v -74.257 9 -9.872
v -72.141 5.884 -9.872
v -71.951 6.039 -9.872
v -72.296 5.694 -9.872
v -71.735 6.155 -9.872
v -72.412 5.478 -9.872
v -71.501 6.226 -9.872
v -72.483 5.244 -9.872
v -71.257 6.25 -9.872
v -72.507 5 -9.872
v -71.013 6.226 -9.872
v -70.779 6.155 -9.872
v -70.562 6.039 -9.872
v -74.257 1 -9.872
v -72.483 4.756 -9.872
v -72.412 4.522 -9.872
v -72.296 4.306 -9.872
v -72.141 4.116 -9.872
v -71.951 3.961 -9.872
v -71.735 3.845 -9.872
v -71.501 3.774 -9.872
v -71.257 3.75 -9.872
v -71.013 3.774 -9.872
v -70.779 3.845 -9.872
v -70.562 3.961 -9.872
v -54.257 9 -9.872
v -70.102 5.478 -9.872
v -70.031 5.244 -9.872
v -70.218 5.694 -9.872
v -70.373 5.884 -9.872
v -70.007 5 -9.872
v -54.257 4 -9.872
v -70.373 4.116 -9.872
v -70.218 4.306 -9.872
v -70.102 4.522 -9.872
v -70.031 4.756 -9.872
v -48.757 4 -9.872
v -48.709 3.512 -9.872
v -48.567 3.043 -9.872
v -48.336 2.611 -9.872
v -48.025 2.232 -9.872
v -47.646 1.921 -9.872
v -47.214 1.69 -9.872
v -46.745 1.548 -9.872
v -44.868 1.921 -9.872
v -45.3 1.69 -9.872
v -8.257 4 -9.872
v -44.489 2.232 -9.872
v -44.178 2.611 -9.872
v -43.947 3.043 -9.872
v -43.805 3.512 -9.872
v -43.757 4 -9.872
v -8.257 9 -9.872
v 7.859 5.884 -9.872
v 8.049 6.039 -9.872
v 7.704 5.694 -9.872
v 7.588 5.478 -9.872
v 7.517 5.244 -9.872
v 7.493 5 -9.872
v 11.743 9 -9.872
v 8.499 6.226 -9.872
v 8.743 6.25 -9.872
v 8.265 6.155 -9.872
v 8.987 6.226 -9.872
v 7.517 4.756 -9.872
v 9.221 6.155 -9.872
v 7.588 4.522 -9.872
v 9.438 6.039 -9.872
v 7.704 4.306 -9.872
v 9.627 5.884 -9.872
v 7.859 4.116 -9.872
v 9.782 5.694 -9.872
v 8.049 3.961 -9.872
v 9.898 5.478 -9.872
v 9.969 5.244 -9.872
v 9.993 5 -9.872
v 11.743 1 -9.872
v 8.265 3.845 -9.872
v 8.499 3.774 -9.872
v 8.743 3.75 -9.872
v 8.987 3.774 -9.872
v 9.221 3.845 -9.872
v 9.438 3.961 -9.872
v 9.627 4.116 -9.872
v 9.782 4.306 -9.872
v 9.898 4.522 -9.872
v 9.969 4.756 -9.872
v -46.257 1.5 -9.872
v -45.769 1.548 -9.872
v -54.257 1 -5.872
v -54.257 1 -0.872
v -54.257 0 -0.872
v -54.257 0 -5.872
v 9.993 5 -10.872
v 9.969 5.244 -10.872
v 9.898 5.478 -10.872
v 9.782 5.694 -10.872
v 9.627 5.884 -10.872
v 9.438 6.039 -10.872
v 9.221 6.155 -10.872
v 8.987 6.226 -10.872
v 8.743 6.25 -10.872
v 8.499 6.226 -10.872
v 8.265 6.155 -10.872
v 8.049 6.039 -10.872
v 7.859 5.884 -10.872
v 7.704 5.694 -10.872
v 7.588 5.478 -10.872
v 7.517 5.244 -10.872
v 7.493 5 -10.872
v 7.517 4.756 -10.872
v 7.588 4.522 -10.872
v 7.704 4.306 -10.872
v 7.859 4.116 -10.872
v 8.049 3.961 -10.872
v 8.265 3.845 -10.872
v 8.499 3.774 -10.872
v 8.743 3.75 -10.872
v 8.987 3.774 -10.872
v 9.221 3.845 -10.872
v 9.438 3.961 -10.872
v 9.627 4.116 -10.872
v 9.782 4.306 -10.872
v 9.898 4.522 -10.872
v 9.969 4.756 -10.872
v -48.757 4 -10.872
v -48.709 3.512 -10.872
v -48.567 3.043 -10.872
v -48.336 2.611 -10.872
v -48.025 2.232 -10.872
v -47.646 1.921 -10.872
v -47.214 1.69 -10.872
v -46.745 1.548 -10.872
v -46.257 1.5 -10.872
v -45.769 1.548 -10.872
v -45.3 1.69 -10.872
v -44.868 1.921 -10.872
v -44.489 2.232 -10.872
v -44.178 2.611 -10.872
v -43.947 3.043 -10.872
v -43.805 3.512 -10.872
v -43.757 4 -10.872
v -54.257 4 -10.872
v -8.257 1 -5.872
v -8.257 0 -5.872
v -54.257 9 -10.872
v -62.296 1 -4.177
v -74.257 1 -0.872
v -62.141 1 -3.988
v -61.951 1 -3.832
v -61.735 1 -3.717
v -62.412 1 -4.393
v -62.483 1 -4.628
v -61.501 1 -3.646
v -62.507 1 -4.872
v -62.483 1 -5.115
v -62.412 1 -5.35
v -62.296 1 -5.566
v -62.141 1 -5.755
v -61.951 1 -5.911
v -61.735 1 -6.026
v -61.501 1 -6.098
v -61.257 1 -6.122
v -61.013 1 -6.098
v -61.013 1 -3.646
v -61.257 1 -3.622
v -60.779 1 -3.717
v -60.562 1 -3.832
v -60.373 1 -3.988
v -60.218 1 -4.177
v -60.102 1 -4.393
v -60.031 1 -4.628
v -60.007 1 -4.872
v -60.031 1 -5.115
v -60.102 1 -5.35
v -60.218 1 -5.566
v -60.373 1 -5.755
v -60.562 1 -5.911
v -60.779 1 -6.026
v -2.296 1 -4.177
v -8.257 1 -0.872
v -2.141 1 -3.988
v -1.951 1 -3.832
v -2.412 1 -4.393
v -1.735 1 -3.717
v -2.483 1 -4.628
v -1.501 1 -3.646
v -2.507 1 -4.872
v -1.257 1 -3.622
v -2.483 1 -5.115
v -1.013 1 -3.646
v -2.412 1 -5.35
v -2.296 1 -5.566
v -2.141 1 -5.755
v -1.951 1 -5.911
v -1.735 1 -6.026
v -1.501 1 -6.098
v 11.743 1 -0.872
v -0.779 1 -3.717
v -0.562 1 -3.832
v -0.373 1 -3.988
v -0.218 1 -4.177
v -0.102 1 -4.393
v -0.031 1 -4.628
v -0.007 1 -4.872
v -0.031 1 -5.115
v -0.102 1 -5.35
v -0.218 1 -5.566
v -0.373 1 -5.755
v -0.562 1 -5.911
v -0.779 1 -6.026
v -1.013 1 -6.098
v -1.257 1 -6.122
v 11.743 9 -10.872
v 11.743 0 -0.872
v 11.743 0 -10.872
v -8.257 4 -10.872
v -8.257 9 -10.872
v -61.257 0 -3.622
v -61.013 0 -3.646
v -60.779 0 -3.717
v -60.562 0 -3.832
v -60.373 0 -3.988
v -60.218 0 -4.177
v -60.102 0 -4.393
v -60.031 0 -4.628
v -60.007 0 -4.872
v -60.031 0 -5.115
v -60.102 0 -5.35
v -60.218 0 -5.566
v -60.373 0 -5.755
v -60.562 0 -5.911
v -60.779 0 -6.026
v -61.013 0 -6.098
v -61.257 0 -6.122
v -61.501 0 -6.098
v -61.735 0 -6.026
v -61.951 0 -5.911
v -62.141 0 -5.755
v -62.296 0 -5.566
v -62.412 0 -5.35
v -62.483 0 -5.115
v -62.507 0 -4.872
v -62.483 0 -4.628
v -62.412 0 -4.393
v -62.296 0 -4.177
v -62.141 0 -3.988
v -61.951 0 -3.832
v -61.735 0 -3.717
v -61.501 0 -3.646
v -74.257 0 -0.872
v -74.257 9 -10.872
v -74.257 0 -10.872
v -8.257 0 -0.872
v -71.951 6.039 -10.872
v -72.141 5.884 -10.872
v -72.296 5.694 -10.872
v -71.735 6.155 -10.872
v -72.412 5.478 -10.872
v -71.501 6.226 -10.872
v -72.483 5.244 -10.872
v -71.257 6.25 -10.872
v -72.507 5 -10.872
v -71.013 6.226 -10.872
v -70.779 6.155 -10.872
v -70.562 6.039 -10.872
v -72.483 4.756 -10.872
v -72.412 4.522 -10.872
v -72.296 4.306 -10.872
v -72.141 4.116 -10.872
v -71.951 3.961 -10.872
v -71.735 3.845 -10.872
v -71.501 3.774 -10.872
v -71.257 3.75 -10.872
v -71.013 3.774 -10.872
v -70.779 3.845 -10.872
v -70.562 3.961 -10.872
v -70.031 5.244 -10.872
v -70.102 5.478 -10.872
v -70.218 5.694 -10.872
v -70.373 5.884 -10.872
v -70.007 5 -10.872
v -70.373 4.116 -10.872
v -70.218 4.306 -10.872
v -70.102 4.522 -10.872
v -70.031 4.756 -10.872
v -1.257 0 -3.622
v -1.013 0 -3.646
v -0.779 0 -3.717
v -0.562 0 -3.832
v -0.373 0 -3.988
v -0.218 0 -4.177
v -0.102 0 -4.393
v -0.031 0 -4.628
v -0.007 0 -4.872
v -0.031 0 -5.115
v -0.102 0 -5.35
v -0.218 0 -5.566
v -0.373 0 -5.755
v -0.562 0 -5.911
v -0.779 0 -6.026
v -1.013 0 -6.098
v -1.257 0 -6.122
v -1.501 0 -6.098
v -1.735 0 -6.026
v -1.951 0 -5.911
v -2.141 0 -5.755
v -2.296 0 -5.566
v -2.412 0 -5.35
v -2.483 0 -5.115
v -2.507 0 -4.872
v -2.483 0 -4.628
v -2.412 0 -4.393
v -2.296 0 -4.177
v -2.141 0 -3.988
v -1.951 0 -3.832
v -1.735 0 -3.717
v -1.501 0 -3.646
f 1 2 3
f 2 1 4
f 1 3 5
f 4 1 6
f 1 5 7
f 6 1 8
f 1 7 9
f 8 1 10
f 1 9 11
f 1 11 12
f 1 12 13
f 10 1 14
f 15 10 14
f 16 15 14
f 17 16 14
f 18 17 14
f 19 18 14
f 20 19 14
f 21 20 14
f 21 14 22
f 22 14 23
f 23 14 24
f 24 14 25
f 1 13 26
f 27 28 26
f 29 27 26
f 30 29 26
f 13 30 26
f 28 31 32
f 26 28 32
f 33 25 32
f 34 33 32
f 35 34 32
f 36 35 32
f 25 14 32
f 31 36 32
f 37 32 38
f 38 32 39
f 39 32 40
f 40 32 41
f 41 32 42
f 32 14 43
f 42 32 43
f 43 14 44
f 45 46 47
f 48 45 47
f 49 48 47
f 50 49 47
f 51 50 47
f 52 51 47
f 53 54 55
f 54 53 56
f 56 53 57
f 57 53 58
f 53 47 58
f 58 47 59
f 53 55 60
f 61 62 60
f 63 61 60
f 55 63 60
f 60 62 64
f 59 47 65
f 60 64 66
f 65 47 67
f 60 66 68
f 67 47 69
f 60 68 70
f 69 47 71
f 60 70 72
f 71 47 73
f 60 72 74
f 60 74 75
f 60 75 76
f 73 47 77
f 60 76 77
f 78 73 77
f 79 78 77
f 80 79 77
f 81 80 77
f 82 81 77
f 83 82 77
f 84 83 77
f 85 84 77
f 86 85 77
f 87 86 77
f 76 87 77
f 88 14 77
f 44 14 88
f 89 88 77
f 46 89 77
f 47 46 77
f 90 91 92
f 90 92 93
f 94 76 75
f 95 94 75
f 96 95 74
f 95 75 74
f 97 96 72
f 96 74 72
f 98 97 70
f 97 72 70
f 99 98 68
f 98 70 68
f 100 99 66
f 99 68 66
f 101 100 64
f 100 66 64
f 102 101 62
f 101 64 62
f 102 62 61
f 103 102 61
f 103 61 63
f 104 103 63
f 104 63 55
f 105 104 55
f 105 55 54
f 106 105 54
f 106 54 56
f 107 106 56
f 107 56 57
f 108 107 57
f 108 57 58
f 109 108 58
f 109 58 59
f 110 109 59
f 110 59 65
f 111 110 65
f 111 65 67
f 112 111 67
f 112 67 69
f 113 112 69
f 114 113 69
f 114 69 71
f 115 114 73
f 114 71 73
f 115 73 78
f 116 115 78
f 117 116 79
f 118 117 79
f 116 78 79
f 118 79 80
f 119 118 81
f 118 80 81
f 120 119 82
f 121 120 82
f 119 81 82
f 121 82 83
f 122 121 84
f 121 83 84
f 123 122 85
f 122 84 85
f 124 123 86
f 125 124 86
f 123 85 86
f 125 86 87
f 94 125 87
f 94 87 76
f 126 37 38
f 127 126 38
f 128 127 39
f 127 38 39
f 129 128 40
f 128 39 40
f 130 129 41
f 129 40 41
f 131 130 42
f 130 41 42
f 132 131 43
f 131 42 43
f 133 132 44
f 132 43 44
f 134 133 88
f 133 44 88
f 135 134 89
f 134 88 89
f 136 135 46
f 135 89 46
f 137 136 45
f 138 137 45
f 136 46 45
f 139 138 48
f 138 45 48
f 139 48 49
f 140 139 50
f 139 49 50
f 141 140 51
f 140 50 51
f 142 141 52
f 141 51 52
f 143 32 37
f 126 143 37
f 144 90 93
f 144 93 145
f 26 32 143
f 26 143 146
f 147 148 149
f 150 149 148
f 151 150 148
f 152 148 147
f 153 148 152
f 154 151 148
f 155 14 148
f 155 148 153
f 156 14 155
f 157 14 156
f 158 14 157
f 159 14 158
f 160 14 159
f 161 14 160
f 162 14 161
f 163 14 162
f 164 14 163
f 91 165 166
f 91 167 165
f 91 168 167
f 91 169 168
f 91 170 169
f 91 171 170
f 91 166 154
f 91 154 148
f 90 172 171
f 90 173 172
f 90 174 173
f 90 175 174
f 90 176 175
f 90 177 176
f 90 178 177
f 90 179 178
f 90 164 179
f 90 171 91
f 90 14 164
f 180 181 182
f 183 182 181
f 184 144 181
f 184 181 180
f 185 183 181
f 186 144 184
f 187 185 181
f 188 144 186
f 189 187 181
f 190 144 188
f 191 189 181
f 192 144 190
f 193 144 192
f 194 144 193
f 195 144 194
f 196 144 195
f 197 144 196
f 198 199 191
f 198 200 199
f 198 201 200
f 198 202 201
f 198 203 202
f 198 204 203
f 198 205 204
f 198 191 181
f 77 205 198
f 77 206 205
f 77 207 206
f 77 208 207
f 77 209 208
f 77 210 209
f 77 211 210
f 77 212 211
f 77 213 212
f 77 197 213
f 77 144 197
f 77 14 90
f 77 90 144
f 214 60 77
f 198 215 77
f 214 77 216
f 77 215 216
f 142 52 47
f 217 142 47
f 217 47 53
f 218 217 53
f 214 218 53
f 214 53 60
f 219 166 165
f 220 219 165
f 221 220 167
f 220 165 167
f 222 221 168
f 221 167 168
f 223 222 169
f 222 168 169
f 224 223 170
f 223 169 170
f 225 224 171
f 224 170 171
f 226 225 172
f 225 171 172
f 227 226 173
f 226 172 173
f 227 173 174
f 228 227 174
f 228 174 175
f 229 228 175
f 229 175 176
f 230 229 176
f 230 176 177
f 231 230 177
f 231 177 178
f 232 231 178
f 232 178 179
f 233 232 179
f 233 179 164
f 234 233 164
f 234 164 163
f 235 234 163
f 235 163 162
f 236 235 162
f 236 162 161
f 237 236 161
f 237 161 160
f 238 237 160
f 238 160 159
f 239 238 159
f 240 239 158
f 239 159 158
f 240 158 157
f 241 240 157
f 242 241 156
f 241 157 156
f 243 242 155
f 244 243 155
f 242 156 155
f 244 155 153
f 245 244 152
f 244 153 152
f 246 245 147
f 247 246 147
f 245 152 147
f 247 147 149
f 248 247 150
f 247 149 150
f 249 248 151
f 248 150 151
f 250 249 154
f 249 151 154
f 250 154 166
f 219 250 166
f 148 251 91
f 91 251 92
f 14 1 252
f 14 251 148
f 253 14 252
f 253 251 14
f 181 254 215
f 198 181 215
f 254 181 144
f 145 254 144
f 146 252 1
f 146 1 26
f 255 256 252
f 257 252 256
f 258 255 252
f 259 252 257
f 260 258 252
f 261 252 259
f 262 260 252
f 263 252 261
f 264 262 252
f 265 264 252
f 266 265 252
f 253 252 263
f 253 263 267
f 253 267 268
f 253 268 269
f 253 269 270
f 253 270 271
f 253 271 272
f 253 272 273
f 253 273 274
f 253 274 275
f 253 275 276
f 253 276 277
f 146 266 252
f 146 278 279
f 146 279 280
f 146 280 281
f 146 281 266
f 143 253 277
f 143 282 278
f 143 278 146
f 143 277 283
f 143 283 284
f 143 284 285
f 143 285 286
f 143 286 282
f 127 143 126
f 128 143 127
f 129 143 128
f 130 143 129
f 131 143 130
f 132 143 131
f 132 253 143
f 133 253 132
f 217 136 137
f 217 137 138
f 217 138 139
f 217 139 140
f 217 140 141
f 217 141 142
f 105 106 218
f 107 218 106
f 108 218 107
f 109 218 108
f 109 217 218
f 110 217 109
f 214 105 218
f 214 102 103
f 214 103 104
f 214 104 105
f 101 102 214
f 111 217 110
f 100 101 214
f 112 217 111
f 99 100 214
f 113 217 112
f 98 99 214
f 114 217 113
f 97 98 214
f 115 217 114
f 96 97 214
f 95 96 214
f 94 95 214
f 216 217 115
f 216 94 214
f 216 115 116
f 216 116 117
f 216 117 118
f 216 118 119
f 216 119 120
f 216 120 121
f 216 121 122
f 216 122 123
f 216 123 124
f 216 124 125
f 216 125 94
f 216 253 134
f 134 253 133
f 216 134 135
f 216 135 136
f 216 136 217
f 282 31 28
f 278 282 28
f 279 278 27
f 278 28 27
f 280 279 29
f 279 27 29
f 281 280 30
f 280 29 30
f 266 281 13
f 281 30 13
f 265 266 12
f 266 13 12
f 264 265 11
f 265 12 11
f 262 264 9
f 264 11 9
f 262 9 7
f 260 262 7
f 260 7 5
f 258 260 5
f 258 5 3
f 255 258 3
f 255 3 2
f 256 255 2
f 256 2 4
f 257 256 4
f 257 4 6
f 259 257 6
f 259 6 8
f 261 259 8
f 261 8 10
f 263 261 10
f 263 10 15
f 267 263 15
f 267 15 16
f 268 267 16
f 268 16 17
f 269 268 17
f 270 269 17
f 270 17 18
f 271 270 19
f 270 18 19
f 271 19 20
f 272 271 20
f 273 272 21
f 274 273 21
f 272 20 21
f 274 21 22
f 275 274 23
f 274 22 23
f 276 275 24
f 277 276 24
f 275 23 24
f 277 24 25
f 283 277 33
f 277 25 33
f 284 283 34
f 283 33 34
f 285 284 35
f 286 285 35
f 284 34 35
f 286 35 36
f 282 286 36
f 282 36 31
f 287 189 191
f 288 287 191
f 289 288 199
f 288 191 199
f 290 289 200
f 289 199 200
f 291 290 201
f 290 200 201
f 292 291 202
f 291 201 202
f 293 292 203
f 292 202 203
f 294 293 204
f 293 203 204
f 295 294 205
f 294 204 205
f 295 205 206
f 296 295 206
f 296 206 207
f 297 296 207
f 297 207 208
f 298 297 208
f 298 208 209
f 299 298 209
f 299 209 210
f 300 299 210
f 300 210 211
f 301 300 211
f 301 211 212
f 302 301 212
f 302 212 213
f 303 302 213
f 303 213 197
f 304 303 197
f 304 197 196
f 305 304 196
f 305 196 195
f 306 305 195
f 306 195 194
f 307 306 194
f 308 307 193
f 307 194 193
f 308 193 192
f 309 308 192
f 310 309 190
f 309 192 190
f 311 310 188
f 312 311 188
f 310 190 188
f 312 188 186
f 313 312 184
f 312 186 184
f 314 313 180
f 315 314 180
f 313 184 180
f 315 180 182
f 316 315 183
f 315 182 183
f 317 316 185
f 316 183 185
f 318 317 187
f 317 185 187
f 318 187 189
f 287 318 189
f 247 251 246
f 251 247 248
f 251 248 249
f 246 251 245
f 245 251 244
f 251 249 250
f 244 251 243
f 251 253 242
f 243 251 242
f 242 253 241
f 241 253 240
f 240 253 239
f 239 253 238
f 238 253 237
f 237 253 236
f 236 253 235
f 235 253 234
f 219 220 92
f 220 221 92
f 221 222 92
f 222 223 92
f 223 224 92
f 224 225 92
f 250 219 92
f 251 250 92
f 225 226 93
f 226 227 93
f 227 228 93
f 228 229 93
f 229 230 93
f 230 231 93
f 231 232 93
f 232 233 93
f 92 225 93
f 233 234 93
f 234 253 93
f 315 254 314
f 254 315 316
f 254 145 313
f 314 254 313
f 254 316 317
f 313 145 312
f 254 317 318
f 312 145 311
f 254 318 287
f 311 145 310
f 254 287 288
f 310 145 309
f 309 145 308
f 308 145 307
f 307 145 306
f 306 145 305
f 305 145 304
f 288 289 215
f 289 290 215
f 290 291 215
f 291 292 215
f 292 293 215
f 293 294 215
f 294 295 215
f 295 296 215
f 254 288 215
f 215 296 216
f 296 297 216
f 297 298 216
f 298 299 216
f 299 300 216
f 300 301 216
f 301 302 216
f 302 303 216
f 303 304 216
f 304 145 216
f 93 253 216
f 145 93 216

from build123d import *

# Parameters (mm, degrees)
ESQUISSE1_W             = 86
ESQUISSE1_H             = 10
BOSS_EXTRU_1_DEPTH      = 1
ESQUISSE2_W             = 86
ESQUISSE2_H             = 1
BOSS_EXTRU_2_DEPTH      = 8
ESQUISSE3_R             = 1.25
ENL_V_MAT_EXTRU_1_DEPTH = 10
ESQUISSE4_R             = 1.25
ENL_V_MAT_EXTRU_2_DEPTH = 10
ESQUISSE5_W             = 46
ESQUISSE5_H             = 5
ENL_V_MAT_EXTRU_3_DEPTH = 10
ESQUISSE6_W             = 46
ESQUISSE6_H             = 5
ENL_V_MAT_EXTRU_4_DEPTH = 10
ESQUISSE8_R             = 2.5
ENL_V_MAT_EXTRU_5_DEPTH = 10


with BuildPart() as part:
    # Esquisse1 → Boss.-Extru.1 (new body)
    with BuildSketch(Plane(origin=(0, 0, 0), x_dir=(1, 0, 0), z_dir=(0, 1, 0))):
        with Locations((-31.256880734, 5.871559633)):
            Rectangle(ESQUISSE1_W, ESQUISSE1_H)
    extrude(amount=BOSS_EXTRU_1_DEPTH)

    # Esquisse2 → Boss.-Extru.2 (add)
    with BuildSketch(Plane(origin=(0, 1, 0), x_dir=(1, 0, 0), z_dir=(0, 1, 0))):
        with Locations((-31.256880734, 10.371559633)):
            Rectangle(ESQUISSE2_W, ESQUISSE2_H)
    extrude(amount=BOSS_EXTRU_2_DEPTH)

    # Esquisse3 → Enlèv. mat.-Extru.1 (cut)
    with BuildSketch(Plane.XY.offset(-9.871559633)):
        with Locations((8.743119266, 5)):
            Circle(ESQUISSE3_R)
        with Locations((-71.256880734, 5)):
            Circle(ESQUISSE3_R)
    extrude(amount=-ENL_V_MAT_EXTRU_1_DEPTH, mode=Mode.SUBTRACT)

    # Esquisse4 → Enlèv. mat.-Extru.2 (cut)
    with BuildSketch(Plane(origin=(0, 1, 0), x_dir=(1, 0, 0), z_dir=(0, 1, 0))):
        with Locations(Location((-61.256880734, 4.871559633, 0), (0, 0, 270))):  # turned: the seam where the file's is
            Circle(ESQUISSE4_R)
        with Locations(Location((-1.256880734, 4.871559633, 0), (0, 0, 270))):  # turned: the seam where the file's is
            Circle(ESQUISSE4_R)
    extrude(amount=-ENL_V_MAT_EXTRU_2_DEPTH, mode=Mode.SUBTRACT)

    # Esquisse5 → Enlèv. mat.-Extru.3 (cut)
    with BuildSketch(Plane(origin=(0, 1, 0), x_dir=(1, 0, 0), z_dir=(0, 1, 0))):
        with Locations((-31.256880734, 3.371559633)):
            Rectangle(ESQUISSE5_W, ESQUISSE5_H)
    extrude(amount=-ENL_V_MAT_EXTRU_3_DEPTH, mode=Mode.SUBTRACT)

    # Esquisse6 → Enlèv. mat.-Extru.4 (cut)
    with BuildSketch(Plane.XY.offset(-9.871559633)):
        with Locations((-31.256880734, 6.5)):
            Rectangle(ESQUISSE6_W, ESQUISSE6_H)
    extrude(amount=-ENL_V_MAT_EXTRU_4_DEPTH, mode=Mode.SUBTRACT)

    # Esquisse8 → Enlèv. mat.-Extru.5 (cut)
    with BuildSketch(Plane.XY.offset(-9.871559633)):
        with Locations((-46.256880734, 4)):
            Circle(ESQUISSE8_R)
    extrude(amount=-ENL_V_MAT_EXTRU_5_DEPTH, mode=Mode.SUBTRACT)


solid = part.part
